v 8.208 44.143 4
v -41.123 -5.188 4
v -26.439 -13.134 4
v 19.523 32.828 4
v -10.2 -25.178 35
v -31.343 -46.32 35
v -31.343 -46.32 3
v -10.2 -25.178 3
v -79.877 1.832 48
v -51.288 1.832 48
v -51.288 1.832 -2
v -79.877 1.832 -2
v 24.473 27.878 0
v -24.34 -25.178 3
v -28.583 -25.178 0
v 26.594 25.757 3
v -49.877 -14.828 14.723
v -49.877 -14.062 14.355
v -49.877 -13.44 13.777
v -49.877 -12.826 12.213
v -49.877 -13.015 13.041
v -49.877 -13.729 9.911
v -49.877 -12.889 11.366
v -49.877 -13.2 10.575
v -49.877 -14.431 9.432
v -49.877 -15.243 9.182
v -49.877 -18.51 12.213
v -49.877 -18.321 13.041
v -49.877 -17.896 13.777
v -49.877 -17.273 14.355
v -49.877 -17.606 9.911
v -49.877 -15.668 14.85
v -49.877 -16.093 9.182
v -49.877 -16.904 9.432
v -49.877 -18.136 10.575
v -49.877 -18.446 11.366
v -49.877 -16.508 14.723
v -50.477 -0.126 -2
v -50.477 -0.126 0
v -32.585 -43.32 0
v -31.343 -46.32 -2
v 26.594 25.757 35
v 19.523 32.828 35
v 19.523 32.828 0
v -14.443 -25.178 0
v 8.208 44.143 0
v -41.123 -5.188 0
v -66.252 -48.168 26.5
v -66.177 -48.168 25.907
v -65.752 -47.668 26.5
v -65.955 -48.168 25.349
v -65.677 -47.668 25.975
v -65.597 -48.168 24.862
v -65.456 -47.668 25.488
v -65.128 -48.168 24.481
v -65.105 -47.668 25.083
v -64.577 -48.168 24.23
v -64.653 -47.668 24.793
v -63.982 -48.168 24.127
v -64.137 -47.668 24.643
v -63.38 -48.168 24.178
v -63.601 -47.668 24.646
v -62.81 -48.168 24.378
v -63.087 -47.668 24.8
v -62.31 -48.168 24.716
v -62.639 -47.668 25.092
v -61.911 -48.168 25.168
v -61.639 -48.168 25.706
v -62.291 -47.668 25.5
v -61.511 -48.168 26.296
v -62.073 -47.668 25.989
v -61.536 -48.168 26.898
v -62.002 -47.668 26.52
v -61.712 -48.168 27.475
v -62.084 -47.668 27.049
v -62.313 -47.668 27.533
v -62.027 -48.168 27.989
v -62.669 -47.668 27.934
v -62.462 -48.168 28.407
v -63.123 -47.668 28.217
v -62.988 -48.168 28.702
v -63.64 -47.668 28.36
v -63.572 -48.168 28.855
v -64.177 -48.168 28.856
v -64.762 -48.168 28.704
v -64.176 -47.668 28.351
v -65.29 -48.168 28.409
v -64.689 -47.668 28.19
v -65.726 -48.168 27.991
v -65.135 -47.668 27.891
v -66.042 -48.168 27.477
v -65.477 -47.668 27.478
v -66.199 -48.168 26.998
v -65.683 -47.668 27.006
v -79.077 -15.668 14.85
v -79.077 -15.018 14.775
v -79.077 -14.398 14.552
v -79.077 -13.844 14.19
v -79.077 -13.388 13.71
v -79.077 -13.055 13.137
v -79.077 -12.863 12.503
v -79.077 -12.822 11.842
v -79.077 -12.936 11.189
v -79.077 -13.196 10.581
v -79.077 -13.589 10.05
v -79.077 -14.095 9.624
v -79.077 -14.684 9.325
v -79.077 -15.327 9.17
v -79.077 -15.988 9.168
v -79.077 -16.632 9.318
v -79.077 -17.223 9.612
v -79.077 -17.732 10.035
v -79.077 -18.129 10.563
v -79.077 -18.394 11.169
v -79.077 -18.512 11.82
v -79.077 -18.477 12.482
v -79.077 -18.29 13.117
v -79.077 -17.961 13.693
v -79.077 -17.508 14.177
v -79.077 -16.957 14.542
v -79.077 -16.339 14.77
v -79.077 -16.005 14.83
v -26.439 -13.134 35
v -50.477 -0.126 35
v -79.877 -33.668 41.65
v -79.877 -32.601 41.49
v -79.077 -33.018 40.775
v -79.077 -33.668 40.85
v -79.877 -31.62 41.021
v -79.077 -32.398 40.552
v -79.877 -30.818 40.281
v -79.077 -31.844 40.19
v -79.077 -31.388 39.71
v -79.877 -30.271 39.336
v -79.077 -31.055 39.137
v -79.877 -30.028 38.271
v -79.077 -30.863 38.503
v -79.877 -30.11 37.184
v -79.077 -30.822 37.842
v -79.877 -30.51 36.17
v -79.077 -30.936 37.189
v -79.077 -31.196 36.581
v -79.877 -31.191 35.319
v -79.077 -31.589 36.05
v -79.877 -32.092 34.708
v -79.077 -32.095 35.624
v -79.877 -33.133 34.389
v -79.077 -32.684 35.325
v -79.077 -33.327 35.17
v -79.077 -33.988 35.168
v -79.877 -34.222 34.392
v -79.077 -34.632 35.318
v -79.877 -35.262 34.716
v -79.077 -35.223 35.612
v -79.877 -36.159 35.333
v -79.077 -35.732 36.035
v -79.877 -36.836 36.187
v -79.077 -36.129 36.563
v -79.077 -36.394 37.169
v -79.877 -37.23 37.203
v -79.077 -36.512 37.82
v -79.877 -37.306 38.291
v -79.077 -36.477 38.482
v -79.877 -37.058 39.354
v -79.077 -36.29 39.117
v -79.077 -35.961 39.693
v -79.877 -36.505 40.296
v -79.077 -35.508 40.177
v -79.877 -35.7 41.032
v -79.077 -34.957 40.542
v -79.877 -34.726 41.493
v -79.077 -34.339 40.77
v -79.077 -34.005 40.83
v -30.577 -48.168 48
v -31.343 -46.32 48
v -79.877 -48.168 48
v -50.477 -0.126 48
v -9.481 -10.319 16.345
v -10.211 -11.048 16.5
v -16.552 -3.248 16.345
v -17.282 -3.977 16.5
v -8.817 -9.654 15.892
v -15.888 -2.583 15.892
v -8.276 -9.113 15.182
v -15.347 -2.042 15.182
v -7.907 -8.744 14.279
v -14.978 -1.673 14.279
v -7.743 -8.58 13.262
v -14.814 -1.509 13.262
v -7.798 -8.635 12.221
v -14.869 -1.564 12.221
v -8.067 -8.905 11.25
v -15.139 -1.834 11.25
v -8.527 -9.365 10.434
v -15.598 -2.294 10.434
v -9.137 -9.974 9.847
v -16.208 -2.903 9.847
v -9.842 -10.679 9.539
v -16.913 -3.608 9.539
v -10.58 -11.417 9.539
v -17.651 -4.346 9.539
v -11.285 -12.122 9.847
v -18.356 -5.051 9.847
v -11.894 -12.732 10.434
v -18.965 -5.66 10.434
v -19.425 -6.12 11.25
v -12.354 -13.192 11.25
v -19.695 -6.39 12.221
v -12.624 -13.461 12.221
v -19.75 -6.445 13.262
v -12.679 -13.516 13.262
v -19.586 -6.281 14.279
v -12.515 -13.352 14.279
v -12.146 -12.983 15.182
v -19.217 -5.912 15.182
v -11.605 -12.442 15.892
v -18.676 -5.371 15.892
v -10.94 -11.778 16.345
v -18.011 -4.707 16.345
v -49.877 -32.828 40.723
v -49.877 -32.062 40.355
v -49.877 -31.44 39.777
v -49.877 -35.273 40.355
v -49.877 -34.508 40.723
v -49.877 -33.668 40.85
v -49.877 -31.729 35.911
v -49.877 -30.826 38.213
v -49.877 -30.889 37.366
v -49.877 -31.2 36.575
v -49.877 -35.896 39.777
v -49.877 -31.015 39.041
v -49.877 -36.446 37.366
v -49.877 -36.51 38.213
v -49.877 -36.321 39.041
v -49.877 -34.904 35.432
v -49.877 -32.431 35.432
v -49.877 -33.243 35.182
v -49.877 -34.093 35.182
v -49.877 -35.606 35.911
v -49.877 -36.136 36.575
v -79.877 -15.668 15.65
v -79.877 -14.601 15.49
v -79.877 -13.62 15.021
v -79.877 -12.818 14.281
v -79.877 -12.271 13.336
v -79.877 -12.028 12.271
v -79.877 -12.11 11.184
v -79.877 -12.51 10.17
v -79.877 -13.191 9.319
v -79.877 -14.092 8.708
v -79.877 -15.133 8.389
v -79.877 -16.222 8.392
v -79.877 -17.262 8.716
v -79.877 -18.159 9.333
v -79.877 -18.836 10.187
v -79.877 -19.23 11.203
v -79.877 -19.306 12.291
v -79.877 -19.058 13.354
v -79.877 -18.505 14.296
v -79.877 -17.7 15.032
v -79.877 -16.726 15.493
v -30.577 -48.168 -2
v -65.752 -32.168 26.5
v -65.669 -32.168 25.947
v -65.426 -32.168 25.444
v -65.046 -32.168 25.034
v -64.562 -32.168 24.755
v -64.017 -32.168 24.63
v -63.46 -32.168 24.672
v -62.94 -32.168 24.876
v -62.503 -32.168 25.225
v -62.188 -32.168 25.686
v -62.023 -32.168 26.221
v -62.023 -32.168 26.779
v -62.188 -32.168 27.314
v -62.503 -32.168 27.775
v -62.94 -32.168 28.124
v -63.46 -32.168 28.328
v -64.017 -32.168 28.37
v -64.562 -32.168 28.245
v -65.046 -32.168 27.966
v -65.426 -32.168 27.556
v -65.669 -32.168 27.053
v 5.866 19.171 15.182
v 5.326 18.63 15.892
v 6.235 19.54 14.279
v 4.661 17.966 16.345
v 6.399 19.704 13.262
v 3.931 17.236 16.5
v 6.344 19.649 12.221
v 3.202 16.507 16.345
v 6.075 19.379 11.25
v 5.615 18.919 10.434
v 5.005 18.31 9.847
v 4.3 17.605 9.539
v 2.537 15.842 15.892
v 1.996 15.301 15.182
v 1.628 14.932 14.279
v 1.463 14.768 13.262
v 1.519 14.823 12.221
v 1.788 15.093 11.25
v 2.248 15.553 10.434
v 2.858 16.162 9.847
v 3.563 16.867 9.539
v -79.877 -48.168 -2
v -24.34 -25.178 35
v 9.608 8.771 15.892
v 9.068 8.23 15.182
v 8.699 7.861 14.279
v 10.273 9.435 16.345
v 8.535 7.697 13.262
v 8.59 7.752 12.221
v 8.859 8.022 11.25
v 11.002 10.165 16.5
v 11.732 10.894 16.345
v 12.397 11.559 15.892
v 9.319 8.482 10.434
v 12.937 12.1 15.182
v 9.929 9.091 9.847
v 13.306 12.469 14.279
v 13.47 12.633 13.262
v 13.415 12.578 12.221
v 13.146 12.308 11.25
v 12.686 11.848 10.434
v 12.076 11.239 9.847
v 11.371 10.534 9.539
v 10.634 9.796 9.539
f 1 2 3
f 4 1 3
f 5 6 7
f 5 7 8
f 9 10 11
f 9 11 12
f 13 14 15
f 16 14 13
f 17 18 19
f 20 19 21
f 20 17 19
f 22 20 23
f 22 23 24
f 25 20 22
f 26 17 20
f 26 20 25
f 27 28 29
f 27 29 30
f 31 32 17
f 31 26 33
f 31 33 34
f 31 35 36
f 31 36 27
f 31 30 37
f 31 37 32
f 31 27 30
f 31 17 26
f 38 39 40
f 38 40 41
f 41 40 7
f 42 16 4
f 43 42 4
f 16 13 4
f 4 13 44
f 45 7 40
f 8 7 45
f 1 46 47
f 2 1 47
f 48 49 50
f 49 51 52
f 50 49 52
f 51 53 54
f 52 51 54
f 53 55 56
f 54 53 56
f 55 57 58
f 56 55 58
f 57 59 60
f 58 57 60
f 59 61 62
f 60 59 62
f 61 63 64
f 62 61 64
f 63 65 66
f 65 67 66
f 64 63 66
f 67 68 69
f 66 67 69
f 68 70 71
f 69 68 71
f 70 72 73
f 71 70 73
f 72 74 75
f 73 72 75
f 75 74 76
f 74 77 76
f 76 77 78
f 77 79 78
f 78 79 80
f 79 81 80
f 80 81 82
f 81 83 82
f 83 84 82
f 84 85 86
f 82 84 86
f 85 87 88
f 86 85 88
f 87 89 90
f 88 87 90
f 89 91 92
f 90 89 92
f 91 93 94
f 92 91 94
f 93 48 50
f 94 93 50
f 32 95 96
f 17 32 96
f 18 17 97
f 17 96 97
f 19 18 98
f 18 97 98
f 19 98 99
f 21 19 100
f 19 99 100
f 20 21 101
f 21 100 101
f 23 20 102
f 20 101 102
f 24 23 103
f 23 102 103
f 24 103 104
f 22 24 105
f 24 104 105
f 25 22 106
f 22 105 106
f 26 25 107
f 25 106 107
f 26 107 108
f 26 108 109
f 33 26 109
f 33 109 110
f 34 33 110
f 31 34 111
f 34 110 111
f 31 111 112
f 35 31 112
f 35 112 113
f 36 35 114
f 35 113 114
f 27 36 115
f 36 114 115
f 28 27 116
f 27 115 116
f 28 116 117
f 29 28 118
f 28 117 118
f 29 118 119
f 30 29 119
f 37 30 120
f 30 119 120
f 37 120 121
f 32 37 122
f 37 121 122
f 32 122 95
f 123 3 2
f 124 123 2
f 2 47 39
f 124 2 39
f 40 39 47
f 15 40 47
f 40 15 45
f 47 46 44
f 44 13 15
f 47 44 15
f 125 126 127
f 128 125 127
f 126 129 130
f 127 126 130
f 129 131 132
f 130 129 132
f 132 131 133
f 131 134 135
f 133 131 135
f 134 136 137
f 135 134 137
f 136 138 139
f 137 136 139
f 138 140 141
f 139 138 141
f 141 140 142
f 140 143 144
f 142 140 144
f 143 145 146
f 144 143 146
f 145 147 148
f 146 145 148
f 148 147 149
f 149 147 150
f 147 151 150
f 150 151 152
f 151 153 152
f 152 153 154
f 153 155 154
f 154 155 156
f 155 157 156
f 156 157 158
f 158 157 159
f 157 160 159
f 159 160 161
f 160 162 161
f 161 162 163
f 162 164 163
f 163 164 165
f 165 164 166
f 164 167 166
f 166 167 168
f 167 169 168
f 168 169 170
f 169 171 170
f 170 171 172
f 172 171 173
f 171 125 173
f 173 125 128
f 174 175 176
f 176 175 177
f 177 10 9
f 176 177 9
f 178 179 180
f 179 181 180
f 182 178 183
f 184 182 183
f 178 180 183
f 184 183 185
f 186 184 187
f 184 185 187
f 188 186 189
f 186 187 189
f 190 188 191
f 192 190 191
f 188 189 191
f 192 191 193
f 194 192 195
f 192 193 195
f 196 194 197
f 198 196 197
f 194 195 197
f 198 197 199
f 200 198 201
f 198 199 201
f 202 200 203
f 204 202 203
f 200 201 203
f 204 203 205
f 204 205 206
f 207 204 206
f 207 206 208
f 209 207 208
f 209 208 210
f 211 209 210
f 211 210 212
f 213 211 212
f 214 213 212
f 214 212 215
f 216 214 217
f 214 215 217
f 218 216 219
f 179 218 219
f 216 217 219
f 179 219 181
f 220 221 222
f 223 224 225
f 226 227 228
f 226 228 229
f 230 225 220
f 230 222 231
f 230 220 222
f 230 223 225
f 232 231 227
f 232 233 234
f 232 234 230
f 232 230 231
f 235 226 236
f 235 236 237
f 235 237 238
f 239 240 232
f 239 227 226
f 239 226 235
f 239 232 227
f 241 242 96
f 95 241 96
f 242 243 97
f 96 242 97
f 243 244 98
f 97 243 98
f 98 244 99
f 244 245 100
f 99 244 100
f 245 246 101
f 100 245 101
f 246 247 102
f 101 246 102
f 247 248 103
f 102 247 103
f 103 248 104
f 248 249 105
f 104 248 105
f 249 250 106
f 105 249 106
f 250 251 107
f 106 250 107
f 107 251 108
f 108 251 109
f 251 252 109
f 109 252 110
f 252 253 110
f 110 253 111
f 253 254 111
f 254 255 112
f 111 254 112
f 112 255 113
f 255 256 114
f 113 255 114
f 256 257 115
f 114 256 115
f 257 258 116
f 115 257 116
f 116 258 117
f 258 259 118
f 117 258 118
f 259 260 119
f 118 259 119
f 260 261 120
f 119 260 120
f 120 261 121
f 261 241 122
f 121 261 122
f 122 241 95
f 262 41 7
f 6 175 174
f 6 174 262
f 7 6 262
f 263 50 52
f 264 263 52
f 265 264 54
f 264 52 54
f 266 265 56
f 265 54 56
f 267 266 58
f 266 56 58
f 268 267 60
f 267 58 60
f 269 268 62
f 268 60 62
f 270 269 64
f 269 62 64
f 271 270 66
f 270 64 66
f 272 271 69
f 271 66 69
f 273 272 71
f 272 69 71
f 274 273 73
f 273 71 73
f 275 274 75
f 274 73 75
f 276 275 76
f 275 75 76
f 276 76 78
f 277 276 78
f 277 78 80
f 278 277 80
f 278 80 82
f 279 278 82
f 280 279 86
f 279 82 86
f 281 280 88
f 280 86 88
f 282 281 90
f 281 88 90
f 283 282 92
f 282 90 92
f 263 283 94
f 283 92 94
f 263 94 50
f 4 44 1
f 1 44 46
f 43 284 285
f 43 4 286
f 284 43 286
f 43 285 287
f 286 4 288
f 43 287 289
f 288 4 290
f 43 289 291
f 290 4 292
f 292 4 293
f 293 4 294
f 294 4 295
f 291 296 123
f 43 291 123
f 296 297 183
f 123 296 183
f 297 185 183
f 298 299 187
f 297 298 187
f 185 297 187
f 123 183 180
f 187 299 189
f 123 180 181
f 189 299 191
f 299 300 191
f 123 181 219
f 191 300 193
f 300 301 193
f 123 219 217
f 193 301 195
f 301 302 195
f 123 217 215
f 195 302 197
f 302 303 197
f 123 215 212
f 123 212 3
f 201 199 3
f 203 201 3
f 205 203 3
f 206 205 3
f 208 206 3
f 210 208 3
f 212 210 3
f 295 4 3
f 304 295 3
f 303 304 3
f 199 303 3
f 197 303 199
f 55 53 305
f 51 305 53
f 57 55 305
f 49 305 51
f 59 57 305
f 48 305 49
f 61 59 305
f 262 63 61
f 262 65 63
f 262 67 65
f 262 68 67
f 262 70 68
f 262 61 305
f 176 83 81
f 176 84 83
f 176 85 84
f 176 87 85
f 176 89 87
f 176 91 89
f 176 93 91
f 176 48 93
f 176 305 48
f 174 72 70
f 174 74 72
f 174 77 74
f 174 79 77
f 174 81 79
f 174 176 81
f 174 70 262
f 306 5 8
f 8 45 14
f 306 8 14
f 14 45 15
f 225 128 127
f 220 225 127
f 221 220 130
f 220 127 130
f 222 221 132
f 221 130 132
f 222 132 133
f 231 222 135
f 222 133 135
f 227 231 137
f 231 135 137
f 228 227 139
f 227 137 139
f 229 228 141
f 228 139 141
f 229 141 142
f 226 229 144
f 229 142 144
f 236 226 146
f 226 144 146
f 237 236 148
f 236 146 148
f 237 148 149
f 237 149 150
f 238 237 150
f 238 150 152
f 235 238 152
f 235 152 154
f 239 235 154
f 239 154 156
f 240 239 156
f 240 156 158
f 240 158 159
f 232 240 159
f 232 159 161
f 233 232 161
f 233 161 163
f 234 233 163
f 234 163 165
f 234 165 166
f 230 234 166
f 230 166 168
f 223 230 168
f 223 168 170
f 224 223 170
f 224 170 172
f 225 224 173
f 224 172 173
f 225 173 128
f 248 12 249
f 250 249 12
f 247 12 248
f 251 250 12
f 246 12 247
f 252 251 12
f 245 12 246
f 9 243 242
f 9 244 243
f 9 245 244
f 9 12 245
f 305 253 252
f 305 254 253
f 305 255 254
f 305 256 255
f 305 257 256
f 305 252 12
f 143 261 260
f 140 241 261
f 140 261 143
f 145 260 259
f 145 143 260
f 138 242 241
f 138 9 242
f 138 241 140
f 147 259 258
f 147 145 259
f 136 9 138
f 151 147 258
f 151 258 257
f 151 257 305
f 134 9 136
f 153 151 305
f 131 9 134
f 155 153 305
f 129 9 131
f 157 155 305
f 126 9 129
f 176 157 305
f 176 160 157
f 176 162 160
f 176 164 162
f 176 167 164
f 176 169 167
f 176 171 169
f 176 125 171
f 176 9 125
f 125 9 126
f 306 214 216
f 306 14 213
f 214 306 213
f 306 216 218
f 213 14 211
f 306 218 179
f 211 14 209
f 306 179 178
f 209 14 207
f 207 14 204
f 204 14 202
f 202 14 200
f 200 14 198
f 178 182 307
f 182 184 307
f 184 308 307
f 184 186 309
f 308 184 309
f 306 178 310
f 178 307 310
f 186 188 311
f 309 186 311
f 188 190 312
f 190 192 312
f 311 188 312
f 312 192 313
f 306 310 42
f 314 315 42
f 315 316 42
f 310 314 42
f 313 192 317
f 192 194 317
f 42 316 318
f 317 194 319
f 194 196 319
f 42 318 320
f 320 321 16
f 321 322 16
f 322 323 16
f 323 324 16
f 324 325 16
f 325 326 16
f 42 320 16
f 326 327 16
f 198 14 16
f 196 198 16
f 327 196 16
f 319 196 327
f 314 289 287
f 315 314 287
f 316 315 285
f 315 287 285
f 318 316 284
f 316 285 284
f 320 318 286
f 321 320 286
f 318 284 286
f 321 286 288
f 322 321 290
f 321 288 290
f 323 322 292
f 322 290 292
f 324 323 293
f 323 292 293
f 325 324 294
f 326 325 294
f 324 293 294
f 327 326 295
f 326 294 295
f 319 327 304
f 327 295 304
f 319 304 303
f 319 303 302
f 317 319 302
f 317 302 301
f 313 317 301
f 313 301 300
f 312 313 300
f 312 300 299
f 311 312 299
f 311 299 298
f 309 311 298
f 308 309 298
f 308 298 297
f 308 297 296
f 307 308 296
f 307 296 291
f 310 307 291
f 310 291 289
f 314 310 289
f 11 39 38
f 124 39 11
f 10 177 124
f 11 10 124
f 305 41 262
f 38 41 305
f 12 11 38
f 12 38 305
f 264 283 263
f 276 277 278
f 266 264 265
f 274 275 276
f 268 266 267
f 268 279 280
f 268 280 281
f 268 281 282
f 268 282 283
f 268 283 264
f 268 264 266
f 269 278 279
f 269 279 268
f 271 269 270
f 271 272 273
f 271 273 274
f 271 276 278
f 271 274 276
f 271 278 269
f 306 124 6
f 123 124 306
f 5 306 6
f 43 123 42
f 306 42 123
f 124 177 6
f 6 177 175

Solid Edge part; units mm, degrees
sketch "Sketch1" plane through (0, 0, 0) normal (0, 0, 1) x (1, 0, 0)
  line L0 (-50.4769, -0.1262) -> (-31.3427, -46.3202)
  line L1 (-31.3427, -46.3202) -> (-10.2002, -25.1777)
  line L2 (-10.2002, -25.1777) -> (-24.3402, -25.1777)
  line L3 (-24.3402, -25.1777) -> (26.5942, 25.7567)
  line L4 (26.5942, 25.7567) -> (19.5231, 32.8278)
  line L5 (19.5231, 32.8278) -> (-26.4388, -13.1341)
  line L6 (-26.4388, -13.1341) -> (-50.4769, -0.1262)
  dimension "D1" = 50
  dimension "D2" = 29.9
  dimension "D3" = 10
  dimension "D4" = 65
  dimension "D5" = 14.14
  dimension "D6" = 70
extrude "Protrusion1" add sketch "Sketch1" along normal blind 35
sketch "Sketch2" plane through (-12.0121, -6.8169, 0) normal (0, 0, -1) x (-0.8794859, 0.4759249, 0)
  line L0 (-1.7996, -43.9425) -> (-10.3318, -15.2857)
  line L1 (-10.3318, -15.2857) -> (2.1041, -22.0153)
  line L2 (2.1041, -22.0153) -> (-18.451, 47.0217)
  line L3 (-18.451, 47.0217) -> (6.4693, 54.4415)
  line L4 (6.4693, 54.4415) -> (28.4484, -19.3779)
  line L5 (28.4484, -19.3779) -> (-1.7996, -43.9425)
  dimension "D1" = 36
extrude "Extrusionsausprägung_6" add sketch "Sketch2" against normal blind 4
sketch "Sketch3" plane through (-3.4579, 9.8468, 19.5) normal (-0.7071068, 0.7071068, 0) x (0, 0, 1)
  circle A0 centre (-6.5, 10.45) radius 3.5
  circle A1 centre (-6.5, -19.55) radius 3.5
  dimension "D1" = 7
  dimension "D2" = 22.05
  dimension "D3" = 13
  dimension "D4" = 30
extrude "Cutout1" cut sketch "Sketch3" against normal through all
sketch "Sketch4" plane through (-11.9413, -6.7462, 35) normal (0, 0, 1) x (0.8794859, -0.4759249, 0)
  line L0 (-37.0421, -12.5178) -> (1.771, -44.0384)
  line L1 (1.771, -44.0384) -> (3.3235, -45.2992)
  line L2 (-40.0351, -68.7623) -> (3.3235, -45.2992)
  line L3 (-63.8314, -24.788) -> (-40.0351, -68.7623)
  line L4 (-38.6875, -11.1816) -> (-63.8314, -24.788)
  line L5 (-37.0421, -12.5178) -> (-38.6875, -11.1816)
  dimension "D1" = 50
  dimension "D2" = 49.3
  dimension "D3" = 2
extrude "Extrusionsausprägung_7" add sketch "Sketch4" against normal blind 37 and the other way blind 13
chamfer "Fase_3" distance 3 angle 45 2 edges at (1.127, 0.2895, 0) (-20.7715, -35.7489, 0)
sketch "Sketch5" plane through (-55.2273, -48.1679, 23) normal (0, -1, 0) x (-1, 0, 0)
  circle A0 centre (8.65, -3.5) radius 1.875
  dimension "D1" = 3.75
  dimension "D2" = 16
  dimension "D3" = 21.5
extrude "Extrusionsausschnitt_6" cut sketch "Sketch5" against normal blind 16
chamfer "Fase_4" distance 0.5 angle 45 1 edges at (-62.0023, -48.1679, 26.5)
sketch "Sketch6" plane through (-79.8773, -23.1679, 23) normal (-1, 0, 0) x (0, 0, 1)
  circle A0 centre (-11, 7.5) radius 2.85
  circle A1 centre (15, -10.5) radius 2.85
  dimension "D1" = 5.7
  dimension "D2" = 14.5
  dimension "D3" = 10
  dimension "D4" = 26
  dimension "D5" = 18
extrude "Extrusionsausschnitt_7" cut sketch "Sketch6" against normal blind 30
chamfer "Fase_5" distance 0.8 angle 45 2 edges at (-79.8773, -15.6679, 9.15) (-79.8773, -33.6679, 35.15)
properties material "Nylon, allgemein"
